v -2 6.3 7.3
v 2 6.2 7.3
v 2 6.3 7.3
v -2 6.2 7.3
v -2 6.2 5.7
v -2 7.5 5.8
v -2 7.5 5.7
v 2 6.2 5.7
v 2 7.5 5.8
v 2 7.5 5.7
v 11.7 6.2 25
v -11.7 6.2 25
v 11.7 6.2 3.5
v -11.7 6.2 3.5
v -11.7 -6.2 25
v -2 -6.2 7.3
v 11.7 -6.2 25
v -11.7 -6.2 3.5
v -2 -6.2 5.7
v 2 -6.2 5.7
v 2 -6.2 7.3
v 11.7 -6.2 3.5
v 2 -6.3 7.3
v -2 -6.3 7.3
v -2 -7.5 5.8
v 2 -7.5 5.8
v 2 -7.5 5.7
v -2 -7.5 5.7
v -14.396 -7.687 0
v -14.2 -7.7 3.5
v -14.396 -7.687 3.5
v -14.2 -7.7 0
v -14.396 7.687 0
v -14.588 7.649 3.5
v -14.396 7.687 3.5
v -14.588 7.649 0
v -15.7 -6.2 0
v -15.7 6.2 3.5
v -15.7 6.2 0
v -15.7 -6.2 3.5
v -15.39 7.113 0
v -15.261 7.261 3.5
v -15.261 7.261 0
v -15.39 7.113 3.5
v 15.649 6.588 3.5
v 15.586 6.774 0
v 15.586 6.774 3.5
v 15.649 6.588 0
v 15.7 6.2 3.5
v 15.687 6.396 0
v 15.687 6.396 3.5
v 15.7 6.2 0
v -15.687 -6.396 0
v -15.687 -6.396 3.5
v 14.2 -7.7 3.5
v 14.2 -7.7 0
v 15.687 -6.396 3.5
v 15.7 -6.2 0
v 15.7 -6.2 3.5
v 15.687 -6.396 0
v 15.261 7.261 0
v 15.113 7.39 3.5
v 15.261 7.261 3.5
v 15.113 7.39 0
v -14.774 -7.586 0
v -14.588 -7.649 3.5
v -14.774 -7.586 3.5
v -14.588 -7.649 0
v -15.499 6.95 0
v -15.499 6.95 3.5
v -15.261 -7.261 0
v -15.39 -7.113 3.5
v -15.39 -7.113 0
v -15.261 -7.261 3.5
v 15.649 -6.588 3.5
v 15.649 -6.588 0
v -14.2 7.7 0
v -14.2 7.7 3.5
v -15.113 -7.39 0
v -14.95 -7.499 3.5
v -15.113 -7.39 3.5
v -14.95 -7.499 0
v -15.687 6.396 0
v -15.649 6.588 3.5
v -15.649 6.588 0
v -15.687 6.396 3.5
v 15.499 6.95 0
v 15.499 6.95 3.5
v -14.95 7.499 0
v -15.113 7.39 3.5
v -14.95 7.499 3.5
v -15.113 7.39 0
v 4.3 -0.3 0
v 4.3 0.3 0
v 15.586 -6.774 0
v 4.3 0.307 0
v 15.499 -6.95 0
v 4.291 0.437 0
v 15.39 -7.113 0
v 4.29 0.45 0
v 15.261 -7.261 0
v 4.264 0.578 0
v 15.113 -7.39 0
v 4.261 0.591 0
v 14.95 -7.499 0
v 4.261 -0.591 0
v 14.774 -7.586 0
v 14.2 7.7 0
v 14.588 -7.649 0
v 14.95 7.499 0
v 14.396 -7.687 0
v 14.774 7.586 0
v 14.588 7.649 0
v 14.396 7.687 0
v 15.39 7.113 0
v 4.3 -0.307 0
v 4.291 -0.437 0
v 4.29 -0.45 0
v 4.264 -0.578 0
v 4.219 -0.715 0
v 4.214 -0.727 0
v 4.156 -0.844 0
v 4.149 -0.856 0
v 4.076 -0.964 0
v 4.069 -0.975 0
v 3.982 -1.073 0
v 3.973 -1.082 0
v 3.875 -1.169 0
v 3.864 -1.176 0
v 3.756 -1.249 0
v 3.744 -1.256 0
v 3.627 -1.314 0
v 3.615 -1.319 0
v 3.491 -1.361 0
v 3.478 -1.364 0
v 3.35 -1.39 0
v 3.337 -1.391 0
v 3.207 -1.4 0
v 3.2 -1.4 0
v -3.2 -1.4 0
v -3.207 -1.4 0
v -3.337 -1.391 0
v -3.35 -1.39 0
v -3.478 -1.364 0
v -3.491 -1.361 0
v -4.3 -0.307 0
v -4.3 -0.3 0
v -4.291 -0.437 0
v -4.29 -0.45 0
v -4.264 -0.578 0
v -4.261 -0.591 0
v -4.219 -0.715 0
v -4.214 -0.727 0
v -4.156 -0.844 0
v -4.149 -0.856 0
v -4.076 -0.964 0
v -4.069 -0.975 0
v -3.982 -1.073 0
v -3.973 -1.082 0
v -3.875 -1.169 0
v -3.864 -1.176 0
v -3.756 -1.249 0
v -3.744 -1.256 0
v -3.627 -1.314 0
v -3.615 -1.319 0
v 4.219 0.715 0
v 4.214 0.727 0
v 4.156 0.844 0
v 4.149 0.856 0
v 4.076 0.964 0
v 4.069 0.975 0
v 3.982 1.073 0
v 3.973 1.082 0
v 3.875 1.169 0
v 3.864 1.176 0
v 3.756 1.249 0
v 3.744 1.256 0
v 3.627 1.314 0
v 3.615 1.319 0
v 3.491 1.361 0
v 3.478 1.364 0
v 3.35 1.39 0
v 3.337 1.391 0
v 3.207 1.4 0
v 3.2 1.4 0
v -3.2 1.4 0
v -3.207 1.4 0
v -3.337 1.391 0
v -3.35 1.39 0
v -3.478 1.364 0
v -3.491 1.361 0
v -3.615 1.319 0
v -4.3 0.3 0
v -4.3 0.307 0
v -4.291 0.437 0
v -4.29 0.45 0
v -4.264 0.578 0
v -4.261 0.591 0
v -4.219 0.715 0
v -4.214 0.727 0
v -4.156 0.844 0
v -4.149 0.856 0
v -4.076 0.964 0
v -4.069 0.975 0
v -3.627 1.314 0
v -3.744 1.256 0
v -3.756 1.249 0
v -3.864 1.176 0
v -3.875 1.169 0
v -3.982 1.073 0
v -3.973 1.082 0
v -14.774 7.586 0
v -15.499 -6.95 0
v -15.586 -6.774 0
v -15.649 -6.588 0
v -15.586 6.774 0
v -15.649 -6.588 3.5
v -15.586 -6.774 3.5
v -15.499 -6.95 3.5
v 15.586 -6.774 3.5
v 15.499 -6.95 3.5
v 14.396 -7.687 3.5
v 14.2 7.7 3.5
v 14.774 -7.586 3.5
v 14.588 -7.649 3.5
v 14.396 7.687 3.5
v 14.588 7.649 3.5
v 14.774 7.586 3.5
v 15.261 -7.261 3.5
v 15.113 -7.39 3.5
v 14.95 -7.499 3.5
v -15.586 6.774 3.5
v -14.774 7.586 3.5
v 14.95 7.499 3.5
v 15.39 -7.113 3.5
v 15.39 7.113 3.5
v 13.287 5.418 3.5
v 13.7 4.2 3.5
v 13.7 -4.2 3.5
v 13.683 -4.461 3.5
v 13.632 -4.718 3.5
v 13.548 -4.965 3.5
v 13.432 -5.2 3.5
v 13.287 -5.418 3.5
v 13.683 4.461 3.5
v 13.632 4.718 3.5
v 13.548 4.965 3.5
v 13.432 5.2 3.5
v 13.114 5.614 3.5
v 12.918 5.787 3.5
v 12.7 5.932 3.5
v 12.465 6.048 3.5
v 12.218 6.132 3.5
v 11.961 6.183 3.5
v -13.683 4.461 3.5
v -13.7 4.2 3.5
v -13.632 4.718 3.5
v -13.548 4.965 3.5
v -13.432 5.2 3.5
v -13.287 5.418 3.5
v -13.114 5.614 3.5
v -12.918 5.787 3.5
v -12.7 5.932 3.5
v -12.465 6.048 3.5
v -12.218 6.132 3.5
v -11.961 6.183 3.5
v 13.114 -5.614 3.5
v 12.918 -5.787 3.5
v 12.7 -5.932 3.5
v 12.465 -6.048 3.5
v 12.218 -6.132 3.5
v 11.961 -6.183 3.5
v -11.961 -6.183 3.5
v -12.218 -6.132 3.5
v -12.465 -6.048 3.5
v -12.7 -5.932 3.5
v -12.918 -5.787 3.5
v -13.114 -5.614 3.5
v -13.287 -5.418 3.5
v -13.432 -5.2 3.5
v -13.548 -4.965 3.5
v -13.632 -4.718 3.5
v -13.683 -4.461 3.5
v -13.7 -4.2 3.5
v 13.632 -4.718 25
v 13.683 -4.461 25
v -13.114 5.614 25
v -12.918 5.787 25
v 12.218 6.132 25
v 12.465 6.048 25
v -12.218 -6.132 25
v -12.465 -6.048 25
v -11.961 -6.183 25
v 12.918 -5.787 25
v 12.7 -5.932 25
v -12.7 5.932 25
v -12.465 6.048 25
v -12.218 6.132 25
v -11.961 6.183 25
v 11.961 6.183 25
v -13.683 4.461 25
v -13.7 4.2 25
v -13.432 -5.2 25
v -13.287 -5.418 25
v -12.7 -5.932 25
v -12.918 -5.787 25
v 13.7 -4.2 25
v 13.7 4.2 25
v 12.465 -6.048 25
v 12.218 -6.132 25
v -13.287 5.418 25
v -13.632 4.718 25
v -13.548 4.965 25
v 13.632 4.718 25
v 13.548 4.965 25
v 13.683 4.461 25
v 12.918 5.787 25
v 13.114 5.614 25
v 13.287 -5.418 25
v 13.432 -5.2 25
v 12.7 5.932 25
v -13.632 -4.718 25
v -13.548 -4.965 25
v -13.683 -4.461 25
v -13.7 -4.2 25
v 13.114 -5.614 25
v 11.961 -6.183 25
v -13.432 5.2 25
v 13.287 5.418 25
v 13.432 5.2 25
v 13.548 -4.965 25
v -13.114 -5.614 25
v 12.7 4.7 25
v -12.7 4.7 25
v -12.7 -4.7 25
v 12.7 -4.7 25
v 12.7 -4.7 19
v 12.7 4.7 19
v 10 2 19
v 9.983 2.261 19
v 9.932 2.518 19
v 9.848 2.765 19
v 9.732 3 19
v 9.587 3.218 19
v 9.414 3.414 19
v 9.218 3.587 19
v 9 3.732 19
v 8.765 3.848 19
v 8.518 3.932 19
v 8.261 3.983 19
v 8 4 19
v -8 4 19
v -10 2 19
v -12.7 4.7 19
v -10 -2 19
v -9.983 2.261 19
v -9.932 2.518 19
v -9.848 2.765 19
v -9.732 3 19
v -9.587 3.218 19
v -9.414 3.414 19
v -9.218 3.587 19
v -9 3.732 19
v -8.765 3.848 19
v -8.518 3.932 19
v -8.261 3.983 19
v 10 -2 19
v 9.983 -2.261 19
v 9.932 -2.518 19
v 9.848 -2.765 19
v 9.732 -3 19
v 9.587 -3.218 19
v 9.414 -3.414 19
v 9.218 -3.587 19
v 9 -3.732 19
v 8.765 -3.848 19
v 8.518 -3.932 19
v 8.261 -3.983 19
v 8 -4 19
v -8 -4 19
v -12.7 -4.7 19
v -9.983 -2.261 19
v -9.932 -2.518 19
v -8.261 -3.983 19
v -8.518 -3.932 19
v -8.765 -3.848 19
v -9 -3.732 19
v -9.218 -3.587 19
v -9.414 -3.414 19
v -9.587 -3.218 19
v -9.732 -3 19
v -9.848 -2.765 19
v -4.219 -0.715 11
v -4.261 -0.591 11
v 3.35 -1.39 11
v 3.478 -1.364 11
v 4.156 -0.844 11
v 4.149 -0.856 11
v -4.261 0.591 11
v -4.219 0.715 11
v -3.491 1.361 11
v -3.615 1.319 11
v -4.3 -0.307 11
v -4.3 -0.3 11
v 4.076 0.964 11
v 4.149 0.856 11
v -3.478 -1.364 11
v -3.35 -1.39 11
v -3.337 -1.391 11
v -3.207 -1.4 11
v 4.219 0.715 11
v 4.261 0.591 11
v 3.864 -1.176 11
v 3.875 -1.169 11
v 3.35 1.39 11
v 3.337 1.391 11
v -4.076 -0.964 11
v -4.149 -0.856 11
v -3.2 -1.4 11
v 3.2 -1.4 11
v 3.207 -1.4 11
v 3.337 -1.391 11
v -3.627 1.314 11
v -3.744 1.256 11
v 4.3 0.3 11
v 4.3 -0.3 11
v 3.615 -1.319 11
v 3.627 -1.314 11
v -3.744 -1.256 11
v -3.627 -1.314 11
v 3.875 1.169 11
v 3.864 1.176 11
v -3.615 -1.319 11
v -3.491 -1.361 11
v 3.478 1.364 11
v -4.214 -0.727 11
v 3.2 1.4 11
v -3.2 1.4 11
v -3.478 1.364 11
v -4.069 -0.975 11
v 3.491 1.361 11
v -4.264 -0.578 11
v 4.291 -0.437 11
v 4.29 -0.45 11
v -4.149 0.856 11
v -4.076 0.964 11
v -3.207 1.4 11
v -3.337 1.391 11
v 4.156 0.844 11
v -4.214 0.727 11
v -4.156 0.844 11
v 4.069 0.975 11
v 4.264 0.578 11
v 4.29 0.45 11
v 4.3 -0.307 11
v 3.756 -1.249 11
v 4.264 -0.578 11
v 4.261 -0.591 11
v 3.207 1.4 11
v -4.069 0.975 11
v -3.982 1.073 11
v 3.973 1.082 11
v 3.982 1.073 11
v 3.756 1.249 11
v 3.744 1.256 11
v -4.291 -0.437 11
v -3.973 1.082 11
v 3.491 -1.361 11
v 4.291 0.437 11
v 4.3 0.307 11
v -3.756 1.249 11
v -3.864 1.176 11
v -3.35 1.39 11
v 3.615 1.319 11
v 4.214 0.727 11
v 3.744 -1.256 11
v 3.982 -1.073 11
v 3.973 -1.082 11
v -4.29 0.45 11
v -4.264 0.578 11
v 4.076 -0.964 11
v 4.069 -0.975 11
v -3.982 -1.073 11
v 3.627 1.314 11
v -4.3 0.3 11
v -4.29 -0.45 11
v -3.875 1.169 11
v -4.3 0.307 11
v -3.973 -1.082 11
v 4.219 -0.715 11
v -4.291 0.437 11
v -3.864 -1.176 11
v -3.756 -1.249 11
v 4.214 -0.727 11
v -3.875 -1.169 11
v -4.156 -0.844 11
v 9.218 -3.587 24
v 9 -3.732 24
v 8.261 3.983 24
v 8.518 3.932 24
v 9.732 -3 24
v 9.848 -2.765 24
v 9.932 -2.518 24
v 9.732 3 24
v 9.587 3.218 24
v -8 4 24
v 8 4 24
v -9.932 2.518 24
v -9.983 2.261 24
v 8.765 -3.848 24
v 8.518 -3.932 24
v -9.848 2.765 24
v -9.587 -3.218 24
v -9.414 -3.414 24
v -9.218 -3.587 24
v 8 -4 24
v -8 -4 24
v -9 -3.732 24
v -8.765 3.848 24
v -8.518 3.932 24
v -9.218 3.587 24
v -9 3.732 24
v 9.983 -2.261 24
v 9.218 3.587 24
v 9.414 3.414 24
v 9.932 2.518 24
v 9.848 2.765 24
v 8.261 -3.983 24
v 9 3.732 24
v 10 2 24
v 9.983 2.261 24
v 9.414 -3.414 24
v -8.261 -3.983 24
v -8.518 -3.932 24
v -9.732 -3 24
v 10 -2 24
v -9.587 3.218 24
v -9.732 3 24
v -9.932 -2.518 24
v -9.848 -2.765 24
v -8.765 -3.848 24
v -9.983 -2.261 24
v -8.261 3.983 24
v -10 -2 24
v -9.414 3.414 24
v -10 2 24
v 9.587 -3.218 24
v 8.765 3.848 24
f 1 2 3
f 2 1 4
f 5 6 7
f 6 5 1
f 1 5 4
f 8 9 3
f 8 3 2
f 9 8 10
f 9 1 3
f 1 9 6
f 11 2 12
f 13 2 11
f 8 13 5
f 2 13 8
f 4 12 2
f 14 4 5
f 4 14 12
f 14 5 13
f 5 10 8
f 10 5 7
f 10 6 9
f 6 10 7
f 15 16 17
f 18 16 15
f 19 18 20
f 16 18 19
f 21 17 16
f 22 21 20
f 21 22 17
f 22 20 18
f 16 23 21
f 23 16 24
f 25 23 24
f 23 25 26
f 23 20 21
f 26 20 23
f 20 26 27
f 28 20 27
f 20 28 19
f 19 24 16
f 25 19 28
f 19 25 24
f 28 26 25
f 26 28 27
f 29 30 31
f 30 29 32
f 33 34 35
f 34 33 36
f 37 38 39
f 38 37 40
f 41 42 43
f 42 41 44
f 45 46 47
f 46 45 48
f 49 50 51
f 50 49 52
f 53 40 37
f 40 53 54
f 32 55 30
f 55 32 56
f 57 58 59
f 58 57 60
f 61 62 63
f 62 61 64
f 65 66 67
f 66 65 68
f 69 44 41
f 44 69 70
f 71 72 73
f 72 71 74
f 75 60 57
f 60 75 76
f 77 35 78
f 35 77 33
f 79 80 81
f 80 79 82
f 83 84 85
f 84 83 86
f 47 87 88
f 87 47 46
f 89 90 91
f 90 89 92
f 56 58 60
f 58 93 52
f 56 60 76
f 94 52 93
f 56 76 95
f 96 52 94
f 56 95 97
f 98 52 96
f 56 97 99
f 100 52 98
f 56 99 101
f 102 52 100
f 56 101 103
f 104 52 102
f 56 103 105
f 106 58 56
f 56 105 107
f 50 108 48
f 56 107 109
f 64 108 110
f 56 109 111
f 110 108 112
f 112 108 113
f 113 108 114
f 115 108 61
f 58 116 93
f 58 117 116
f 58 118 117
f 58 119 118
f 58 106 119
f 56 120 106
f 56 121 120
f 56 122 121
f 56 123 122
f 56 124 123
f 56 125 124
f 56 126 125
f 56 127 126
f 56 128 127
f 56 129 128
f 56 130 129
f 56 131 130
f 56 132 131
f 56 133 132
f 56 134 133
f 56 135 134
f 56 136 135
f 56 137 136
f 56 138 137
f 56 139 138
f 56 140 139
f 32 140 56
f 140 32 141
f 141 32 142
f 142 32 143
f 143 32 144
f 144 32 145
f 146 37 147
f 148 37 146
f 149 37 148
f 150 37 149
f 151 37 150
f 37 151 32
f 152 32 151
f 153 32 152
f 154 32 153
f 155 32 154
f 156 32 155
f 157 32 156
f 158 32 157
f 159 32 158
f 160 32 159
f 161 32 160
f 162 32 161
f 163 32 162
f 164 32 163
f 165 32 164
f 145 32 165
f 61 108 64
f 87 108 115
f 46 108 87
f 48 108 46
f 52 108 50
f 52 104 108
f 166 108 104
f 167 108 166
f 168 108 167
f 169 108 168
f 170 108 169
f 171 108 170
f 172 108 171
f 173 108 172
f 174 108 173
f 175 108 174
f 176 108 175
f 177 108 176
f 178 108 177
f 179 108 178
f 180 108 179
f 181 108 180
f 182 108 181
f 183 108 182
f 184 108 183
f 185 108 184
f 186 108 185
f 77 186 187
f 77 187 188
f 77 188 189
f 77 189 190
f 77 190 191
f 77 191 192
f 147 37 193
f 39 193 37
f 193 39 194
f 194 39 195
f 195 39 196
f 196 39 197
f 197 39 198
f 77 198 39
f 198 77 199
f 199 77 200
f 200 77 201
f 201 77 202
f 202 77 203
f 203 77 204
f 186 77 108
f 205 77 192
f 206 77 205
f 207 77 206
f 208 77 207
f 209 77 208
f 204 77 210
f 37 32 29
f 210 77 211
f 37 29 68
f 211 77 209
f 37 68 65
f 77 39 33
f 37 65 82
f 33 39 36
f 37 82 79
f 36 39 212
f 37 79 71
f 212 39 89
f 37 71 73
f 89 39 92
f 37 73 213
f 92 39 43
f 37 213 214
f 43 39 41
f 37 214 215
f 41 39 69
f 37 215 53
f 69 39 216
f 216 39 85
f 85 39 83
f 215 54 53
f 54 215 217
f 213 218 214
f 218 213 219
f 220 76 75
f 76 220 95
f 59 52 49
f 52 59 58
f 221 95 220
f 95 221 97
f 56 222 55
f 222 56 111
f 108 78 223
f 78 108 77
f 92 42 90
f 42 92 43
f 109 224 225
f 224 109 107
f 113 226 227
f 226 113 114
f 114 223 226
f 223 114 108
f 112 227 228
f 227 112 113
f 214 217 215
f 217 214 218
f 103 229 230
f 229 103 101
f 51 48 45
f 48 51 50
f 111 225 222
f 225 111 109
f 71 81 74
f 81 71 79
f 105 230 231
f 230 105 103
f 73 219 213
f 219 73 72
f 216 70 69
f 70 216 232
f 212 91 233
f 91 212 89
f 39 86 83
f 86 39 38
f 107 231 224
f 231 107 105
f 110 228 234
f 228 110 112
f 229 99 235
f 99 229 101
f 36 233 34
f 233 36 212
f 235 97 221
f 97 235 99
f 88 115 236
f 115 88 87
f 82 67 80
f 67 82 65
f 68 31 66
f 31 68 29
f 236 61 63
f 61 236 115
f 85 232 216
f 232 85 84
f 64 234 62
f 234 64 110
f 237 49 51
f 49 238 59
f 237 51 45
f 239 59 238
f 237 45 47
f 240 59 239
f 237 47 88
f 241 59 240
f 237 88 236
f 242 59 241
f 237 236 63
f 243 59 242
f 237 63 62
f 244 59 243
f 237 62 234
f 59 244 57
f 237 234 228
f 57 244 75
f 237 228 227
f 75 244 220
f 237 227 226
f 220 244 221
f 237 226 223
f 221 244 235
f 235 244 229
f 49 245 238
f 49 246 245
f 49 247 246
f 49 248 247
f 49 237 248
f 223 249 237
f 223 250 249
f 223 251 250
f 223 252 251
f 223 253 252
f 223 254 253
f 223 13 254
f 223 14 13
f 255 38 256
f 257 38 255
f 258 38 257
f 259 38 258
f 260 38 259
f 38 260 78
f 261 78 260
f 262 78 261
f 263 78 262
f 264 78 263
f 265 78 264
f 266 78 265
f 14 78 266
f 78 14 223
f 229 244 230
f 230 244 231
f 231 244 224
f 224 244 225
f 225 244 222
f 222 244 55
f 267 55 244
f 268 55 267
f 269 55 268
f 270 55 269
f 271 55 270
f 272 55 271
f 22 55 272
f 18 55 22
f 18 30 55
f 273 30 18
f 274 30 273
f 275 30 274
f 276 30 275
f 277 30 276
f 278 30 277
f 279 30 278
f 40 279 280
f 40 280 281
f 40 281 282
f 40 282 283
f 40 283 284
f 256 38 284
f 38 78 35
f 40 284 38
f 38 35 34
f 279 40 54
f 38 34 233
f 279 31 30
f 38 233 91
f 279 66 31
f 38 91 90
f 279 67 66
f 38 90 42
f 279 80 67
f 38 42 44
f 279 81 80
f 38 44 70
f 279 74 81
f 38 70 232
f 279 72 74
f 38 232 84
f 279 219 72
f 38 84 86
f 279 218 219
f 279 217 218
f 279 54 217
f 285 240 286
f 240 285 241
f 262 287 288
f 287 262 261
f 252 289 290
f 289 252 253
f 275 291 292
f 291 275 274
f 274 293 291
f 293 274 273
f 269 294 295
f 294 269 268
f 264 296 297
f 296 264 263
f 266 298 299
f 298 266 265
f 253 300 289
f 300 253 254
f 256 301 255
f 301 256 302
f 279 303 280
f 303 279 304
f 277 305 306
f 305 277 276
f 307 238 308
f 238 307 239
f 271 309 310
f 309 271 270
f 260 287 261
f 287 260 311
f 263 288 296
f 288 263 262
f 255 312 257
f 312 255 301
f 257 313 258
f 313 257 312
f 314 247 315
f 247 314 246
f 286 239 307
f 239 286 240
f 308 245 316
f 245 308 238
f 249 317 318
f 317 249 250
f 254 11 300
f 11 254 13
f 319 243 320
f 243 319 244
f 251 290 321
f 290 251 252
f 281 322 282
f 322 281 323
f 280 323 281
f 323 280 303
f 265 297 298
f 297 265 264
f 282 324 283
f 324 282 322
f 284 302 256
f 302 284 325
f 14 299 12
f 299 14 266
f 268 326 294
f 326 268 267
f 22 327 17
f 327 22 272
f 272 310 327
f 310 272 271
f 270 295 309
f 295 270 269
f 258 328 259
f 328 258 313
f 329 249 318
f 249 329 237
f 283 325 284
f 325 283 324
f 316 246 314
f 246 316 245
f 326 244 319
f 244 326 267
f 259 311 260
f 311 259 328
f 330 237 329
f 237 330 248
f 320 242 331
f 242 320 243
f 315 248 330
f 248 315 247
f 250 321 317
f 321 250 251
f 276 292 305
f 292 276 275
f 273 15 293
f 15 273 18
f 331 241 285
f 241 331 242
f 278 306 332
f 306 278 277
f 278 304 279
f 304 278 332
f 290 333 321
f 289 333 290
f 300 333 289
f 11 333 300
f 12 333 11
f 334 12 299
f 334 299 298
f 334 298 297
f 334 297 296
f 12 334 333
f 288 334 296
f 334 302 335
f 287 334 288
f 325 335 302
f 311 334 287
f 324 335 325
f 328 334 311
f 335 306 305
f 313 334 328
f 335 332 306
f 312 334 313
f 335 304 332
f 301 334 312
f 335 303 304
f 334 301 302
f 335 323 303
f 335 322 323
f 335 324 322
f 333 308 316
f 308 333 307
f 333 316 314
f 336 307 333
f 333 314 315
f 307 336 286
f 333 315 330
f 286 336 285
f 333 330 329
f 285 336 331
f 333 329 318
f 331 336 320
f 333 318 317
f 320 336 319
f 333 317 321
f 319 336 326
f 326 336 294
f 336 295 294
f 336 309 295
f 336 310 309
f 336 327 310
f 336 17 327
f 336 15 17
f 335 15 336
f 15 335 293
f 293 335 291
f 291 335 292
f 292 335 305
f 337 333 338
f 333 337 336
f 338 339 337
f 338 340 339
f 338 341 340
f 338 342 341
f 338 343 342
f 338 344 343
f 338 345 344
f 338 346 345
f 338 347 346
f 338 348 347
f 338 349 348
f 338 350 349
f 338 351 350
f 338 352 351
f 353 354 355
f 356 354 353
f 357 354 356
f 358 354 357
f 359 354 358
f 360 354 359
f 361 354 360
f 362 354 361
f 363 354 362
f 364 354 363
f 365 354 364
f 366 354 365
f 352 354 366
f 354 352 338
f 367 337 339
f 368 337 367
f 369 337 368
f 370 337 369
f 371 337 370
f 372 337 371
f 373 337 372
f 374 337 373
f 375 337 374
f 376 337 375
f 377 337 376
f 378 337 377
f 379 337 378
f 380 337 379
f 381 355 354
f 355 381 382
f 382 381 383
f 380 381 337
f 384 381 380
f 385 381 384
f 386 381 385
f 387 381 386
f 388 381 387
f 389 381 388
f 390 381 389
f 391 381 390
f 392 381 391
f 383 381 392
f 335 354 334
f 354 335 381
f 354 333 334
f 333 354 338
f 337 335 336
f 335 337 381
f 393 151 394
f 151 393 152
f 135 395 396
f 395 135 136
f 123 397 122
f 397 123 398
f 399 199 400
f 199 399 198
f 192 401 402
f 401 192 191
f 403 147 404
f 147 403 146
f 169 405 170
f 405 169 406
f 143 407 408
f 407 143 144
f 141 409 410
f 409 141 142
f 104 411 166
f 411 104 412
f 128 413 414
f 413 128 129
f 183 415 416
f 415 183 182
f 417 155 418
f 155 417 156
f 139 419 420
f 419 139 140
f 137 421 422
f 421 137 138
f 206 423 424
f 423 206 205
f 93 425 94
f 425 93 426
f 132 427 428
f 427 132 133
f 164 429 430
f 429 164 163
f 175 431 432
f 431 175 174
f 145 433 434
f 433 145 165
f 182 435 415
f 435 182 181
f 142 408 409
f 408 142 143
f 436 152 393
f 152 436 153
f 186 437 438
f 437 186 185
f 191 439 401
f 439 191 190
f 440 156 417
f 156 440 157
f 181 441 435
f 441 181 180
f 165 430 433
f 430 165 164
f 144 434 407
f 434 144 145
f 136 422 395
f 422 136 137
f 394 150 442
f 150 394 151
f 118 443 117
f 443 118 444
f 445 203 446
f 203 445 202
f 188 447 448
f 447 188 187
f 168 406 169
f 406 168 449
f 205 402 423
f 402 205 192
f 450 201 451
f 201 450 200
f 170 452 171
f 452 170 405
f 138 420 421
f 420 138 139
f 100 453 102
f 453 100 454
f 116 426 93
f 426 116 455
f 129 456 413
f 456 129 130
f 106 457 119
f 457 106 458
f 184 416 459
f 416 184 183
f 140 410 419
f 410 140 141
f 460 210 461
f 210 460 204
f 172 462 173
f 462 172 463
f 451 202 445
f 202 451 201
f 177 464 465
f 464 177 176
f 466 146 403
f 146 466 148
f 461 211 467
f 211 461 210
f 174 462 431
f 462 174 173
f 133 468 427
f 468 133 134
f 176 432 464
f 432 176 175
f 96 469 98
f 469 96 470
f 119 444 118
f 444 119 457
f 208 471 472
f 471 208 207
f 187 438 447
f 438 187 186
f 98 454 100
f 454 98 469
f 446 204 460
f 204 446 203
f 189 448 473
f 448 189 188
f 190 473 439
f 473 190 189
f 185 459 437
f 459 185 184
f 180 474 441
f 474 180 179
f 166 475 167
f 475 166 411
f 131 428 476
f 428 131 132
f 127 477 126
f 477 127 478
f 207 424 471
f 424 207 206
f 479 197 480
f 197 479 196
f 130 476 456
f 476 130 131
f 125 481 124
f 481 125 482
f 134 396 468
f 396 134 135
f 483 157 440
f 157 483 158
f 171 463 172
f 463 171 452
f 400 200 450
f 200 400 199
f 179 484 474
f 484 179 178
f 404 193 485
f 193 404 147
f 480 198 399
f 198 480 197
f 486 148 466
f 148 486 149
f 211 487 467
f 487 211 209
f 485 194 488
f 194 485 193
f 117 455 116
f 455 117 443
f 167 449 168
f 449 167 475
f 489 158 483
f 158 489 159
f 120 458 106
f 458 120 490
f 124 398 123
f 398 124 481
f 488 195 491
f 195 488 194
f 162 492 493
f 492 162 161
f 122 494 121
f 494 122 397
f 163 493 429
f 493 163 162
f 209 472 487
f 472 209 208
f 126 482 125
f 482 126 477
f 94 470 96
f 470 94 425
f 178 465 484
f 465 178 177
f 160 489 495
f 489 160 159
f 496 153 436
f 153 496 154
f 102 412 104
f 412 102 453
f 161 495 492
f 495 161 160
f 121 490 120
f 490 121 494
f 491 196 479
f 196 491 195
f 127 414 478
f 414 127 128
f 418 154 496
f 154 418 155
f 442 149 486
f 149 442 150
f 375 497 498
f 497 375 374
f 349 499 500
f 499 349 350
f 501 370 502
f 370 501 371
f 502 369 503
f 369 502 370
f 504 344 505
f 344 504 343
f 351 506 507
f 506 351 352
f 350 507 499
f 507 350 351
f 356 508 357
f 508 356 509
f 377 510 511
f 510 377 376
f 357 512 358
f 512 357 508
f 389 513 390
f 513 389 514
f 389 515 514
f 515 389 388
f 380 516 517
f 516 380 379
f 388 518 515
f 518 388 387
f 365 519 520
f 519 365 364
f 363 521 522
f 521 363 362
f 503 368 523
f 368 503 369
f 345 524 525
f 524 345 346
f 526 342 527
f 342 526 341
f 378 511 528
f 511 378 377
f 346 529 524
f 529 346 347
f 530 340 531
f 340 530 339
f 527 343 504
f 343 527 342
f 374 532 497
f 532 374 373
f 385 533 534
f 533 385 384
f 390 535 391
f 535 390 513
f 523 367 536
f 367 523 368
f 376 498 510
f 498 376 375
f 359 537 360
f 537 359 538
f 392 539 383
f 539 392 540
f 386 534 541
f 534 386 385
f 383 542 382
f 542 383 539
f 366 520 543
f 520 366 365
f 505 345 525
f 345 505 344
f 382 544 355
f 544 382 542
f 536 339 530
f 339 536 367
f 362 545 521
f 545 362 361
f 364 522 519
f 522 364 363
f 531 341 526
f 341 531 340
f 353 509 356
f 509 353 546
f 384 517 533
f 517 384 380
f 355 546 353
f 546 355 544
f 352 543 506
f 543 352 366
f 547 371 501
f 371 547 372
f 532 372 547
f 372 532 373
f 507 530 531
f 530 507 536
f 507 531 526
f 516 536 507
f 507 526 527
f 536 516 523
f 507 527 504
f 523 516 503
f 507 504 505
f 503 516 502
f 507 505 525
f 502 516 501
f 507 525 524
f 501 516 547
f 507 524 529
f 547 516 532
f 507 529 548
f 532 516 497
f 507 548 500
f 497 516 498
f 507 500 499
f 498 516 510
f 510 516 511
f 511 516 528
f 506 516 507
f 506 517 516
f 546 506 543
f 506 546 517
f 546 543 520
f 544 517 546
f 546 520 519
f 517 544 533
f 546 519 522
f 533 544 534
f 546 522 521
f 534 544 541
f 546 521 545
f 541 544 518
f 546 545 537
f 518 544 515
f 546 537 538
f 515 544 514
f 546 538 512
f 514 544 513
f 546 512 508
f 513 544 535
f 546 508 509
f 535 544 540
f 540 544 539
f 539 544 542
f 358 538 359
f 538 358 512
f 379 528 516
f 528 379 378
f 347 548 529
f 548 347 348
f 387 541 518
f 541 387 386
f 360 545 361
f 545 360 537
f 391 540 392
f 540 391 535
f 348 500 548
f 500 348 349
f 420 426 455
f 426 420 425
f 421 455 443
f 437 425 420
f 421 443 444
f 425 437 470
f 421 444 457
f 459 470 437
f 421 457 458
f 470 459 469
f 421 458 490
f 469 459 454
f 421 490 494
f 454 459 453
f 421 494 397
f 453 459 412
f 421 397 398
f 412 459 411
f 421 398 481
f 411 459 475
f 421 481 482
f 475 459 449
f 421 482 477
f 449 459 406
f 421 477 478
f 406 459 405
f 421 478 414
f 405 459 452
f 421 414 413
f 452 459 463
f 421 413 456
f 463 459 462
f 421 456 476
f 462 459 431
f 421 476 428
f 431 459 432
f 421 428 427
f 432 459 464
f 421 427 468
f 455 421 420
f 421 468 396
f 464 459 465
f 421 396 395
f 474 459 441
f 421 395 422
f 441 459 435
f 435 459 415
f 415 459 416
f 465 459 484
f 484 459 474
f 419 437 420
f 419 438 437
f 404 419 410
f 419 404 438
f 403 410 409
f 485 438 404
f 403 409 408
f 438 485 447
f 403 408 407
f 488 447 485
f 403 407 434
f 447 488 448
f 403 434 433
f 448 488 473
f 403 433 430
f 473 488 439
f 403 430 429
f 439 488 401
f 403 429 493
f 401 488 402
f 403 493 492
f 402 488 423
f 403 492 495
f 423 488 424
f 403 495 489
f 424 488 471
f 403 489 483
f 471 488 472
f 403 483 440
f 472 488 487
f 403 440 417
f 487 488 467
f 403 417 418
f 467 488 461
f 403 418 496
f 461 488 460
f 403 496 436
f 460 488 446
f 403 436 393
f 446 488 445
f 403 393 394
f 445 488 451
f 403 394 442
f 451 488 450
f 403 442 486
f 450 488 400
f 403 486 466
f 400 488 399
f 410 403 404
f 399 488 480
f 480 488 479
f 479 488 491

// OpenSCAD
// file: parameters.scad
// ============================================
// MODULAR CABLE ORGANIZER - SHARED PARAMETERS
// ============================================
// All dimensions in mm - include this in all files
// ============================================

$fn = 48;

// === TOLERANCES ===
clearance = 0.3;
port_clearance = 0.1;  // Extra clearance for port openings (reduced - 0.2 was too loose for USB-C)
wall = 1.6;

// === SLOT DIMENSIONS (2:1 aspect ratio) - scaled to 2/3 ===
slot_width = 32;  // Standard wide slot for larger connectors
slot_width_narrow = 16;  // Narrow slot for compact connectors (USB-C, micro-USB, USB-A, Lightning, 3.5mm)
slot_height = 16;  // Height is same for both wide and narrow
slot_depth = 4;  // Reduced from 6mm - less frame depth needed

// === FRAME STRUCTURE ===
frame_wall = 2.0;   // Wall between slots - 6 layers @ 0.4mm nozzle for strength
frame_border = 6;  // Increased by 10mm for mounting holes with countersink
frame_back = 2;     // Slightly thicker for snap catch strength
mount_hole_dia = 3;
countersink_dia = 6;  // Diameter of countersink for screw heads
countersink_depth = 2;  // Depth of countersink

// === DEFAULT GRID (can be overridden in individual files) ===
grid_cols = 2;
grid_rows = 2;

// === INSERT BASE DIMENSIONS ===
insert_width = slot_width - (2 * clearance);
insert_height = slot_height - (2 * clearance);
insert_base_depth = slot_depth - 0.5;

// === NARROW INSERT BASE DIMENSIONS ===
insert_width_narrow = slot_width_narrow - (2 * clearance);
insert_height_narrow = slot_height - (2 * clearance);

// === INSERT BODY (protrudes from frame) ===
insert_body_width = insert_width - 4;
insert_body_height = insert_height - 3;
insert_body_depth = 15.5;  // Standardized depth (USB-B 15.26mm + 0.25mm buffer) - all inserts same height
insert_top_thick = 1.5;  // Top platform thickness

// === NARROW INSERT BODY (protrudes from frame) ===
insert_body_width_narrow = insert_width_narrow - 4;
insert_body_height_narrow = insert_height_narrow - 3;

// === SNAP TABS (on neck/body - catch on back plate) ===
snap_tab_width = 4;
snap_tab_protrude = 1.2;  // How far tab sticks out from body
snap_tab_thick = 1.5;     // Z thickness of tab
snap_tab_offset = 2.2;      // Distance from base to tab bottom on insert (increased to clear frame)

// === CONNECTOR PORT DIMENSIONS & BODY DEPTHS ===
// Port dimensions from reference blueprints
// Body depths sized to match typical male connector lengths

// USB-C: 8.4 x 2.6mm, male connector ~9mm
usbc_w = 8.4;
usbc_h = 2.6;
usbc_r = 1.0;
usbc_body_depth = 15.5;  // Standardized depth (USB-B 15.26mm + 0.25mm buffer)
// NO RETENTION RIBS for USB-C (removed per user request)

// USB-A: 13.0 x 4.5mm (standard male USB-A height)
usba_w = 13.0;
usba_h = 4.5;  // Match actual male USB-A height
usba_r = 0.5;
usba_body_depth = 15.5;  // Standardized depth (USB-B 15.26mm + 0.25mm buffer)
usba_retention_rib_depth = 5.0;  // Distance from front (moved back 1mm so ribs don't break)
usba_retention_rib_size = 0.15;  // How far ribs protrude inward

// USB Mini: 6.9 x 3.0mm, male connector ~9mm
usb_mini_w = 6.9;
usb_mini_h = 3.0;
usb_mini_r = 0.5;
usb_mini_body_depth = 15.5;  // Standardized depth (USB-B 15.26mm + 0.25mm buffer)
usb_mini_retention_rib_depth = 3.5;  // Distance from front where retention ribs start
usb_mini_retention_rib_size = 0.125;  // Reduced to half (was 0.25)

// USB Micro-B: 7.4 x 1.8mm (wider to fit corners of trapezoid)
usb_micro_w = 7.4;  // Increased width for corners
usb_micro_h = 1.8;
usb_micro_r = 0.3;
usb_micro_body_depth = 15.5;  // Standardized depth (USB-B 15.26mm + 0.25mm buffer)
usb_micro_retention_rib_depth = 4.5;  // Distance from front (moved back 1mm so ribs don't break)
usb_micro_retention_rib_size = 0.125;  // How far ribs protrude inward

// USB-B: 8.75 x 7.78mm (standard male USB-B height)
usb_b_w = 8.75;  // Width at bottom (wider)
usb_b_h = 7.78;  // Match actual male USB-B height (reduced from 7.9)
usb_b_r = 0.6;   // Corner radius
usb_b_top_inset = 0.9;  // How much narrower the top is (creates trapezoid shape)
usb_b_body_depth = 15.5;  // Standardized depth (15.26mm connector + 0.25mm buffer)
usb_b_retention_rib_depth = 5.5;  // Distance from front (moved back 1mm so ribs don't break)
usb_b_retention_rib_size = 0.15;  // How far ribs protrude inward

// Lightning: 7.6 x 1.5mm, male connector ~8mm (measured from actual connector)
lightning_w = 7.6;
lightning_h = 1.5;
lightning_r = 0.5;
lightning_body_depth = 15.5;  // Standardized depth (USB-B 15.26mm + 0.25mm buffer)
lightning_retention_rib_depth = 4.0;  // Distance from front (moved back 1mm so ribs don't break)
lightning_retention_rib_size = 0.1;   // How far ribs protrude inward

// HDMI: 14.65 x 4.45mm (standard male HDMI height)
hdmi_w = 14.65;
hdmi_h = 4.45;  // Match actual male HDMI height
hdmi_r = 0.5;
hdmi_body_depth = 15.5;  // Standardized depth (USB-B 15.26mm + 0.25mm buffer)
hdmi_retention_rib_depth = 6.0;  // Distance from front (moved back 1mm so ribs don't break)
hdmi_retention_rib_size = 0.1;   // How far ribs protrude inward

// 3.5mm Audio Jack: standard 3.5mm (1/8") diameter
audio_jack_dia = 3.6;  // 3.5mm + 0.1mm for less snug fit
audio_jack_body_depth = 15.5;  // Standardized depth (USB-B 15.26mm + 0.25mm buffer)
// Ring positions for TRS/TRRS ribs (tip, ring1, ring2 from front)
audio_jack_ring1 = 3.5;  // First ring position from front
audio_jack_ring2 = 6.5;  // Second ring position from front

// Blank/Label: recessed area for label
label_w = 30;
label_h = 12;
label_depth = 0.8;

// AC Power Plug: asymmetric holes for polarity (US 2-prong)
// Prongs are VERTICAL (tall and thin)
// Hot prong (narrower): 1.6mm wide x 6.5mm tall
// Neutral prong (wider): 1.6mm wide x 8.5mm tall (increased)
power_hot_w = 1.6;   // Width (thin dimension)
power_hot_h = 6.5;   // Height (tall dimension)
power_neutral_w = 1.6;   // Width (thin dimension)
power_neutral_h = 8.5;   // Height (tall dimension, increased from 8.1)
power_prong_spacing = 12.7;  // 0.5" center-to-center
power_body_depth = 15.5;  // Standardized depth (USB-B 15.26mm + 0.25mm buffer)

// === CALCULATED VALUES ===
frame_total_depth = frame_back + slot_depth;
grid_width = (grid_cols * slot_width) + ((grid_cols - 1) * frame_wall);
grid_height = (grid_rows * slot_height) + ((grid_rows - 1) * frame_wall);
frame_width = grid_width + (2 * frame_border);
frame_height_total = grid_height + (2 * frame_border);
insert_total_depth = insert_base_depth + insert_body_depth;
// main file
// ============================================
// PRINT FILE: Universal Male Terminator
// ============================================
// Cable-end connector that plugs into universal inserts
// Replaces proprietary cable ends with standardized 24-pin plug
// ============================================

include <insert_universal_base.scad>

// Render the universal male terminator
universal_male_terminator();
